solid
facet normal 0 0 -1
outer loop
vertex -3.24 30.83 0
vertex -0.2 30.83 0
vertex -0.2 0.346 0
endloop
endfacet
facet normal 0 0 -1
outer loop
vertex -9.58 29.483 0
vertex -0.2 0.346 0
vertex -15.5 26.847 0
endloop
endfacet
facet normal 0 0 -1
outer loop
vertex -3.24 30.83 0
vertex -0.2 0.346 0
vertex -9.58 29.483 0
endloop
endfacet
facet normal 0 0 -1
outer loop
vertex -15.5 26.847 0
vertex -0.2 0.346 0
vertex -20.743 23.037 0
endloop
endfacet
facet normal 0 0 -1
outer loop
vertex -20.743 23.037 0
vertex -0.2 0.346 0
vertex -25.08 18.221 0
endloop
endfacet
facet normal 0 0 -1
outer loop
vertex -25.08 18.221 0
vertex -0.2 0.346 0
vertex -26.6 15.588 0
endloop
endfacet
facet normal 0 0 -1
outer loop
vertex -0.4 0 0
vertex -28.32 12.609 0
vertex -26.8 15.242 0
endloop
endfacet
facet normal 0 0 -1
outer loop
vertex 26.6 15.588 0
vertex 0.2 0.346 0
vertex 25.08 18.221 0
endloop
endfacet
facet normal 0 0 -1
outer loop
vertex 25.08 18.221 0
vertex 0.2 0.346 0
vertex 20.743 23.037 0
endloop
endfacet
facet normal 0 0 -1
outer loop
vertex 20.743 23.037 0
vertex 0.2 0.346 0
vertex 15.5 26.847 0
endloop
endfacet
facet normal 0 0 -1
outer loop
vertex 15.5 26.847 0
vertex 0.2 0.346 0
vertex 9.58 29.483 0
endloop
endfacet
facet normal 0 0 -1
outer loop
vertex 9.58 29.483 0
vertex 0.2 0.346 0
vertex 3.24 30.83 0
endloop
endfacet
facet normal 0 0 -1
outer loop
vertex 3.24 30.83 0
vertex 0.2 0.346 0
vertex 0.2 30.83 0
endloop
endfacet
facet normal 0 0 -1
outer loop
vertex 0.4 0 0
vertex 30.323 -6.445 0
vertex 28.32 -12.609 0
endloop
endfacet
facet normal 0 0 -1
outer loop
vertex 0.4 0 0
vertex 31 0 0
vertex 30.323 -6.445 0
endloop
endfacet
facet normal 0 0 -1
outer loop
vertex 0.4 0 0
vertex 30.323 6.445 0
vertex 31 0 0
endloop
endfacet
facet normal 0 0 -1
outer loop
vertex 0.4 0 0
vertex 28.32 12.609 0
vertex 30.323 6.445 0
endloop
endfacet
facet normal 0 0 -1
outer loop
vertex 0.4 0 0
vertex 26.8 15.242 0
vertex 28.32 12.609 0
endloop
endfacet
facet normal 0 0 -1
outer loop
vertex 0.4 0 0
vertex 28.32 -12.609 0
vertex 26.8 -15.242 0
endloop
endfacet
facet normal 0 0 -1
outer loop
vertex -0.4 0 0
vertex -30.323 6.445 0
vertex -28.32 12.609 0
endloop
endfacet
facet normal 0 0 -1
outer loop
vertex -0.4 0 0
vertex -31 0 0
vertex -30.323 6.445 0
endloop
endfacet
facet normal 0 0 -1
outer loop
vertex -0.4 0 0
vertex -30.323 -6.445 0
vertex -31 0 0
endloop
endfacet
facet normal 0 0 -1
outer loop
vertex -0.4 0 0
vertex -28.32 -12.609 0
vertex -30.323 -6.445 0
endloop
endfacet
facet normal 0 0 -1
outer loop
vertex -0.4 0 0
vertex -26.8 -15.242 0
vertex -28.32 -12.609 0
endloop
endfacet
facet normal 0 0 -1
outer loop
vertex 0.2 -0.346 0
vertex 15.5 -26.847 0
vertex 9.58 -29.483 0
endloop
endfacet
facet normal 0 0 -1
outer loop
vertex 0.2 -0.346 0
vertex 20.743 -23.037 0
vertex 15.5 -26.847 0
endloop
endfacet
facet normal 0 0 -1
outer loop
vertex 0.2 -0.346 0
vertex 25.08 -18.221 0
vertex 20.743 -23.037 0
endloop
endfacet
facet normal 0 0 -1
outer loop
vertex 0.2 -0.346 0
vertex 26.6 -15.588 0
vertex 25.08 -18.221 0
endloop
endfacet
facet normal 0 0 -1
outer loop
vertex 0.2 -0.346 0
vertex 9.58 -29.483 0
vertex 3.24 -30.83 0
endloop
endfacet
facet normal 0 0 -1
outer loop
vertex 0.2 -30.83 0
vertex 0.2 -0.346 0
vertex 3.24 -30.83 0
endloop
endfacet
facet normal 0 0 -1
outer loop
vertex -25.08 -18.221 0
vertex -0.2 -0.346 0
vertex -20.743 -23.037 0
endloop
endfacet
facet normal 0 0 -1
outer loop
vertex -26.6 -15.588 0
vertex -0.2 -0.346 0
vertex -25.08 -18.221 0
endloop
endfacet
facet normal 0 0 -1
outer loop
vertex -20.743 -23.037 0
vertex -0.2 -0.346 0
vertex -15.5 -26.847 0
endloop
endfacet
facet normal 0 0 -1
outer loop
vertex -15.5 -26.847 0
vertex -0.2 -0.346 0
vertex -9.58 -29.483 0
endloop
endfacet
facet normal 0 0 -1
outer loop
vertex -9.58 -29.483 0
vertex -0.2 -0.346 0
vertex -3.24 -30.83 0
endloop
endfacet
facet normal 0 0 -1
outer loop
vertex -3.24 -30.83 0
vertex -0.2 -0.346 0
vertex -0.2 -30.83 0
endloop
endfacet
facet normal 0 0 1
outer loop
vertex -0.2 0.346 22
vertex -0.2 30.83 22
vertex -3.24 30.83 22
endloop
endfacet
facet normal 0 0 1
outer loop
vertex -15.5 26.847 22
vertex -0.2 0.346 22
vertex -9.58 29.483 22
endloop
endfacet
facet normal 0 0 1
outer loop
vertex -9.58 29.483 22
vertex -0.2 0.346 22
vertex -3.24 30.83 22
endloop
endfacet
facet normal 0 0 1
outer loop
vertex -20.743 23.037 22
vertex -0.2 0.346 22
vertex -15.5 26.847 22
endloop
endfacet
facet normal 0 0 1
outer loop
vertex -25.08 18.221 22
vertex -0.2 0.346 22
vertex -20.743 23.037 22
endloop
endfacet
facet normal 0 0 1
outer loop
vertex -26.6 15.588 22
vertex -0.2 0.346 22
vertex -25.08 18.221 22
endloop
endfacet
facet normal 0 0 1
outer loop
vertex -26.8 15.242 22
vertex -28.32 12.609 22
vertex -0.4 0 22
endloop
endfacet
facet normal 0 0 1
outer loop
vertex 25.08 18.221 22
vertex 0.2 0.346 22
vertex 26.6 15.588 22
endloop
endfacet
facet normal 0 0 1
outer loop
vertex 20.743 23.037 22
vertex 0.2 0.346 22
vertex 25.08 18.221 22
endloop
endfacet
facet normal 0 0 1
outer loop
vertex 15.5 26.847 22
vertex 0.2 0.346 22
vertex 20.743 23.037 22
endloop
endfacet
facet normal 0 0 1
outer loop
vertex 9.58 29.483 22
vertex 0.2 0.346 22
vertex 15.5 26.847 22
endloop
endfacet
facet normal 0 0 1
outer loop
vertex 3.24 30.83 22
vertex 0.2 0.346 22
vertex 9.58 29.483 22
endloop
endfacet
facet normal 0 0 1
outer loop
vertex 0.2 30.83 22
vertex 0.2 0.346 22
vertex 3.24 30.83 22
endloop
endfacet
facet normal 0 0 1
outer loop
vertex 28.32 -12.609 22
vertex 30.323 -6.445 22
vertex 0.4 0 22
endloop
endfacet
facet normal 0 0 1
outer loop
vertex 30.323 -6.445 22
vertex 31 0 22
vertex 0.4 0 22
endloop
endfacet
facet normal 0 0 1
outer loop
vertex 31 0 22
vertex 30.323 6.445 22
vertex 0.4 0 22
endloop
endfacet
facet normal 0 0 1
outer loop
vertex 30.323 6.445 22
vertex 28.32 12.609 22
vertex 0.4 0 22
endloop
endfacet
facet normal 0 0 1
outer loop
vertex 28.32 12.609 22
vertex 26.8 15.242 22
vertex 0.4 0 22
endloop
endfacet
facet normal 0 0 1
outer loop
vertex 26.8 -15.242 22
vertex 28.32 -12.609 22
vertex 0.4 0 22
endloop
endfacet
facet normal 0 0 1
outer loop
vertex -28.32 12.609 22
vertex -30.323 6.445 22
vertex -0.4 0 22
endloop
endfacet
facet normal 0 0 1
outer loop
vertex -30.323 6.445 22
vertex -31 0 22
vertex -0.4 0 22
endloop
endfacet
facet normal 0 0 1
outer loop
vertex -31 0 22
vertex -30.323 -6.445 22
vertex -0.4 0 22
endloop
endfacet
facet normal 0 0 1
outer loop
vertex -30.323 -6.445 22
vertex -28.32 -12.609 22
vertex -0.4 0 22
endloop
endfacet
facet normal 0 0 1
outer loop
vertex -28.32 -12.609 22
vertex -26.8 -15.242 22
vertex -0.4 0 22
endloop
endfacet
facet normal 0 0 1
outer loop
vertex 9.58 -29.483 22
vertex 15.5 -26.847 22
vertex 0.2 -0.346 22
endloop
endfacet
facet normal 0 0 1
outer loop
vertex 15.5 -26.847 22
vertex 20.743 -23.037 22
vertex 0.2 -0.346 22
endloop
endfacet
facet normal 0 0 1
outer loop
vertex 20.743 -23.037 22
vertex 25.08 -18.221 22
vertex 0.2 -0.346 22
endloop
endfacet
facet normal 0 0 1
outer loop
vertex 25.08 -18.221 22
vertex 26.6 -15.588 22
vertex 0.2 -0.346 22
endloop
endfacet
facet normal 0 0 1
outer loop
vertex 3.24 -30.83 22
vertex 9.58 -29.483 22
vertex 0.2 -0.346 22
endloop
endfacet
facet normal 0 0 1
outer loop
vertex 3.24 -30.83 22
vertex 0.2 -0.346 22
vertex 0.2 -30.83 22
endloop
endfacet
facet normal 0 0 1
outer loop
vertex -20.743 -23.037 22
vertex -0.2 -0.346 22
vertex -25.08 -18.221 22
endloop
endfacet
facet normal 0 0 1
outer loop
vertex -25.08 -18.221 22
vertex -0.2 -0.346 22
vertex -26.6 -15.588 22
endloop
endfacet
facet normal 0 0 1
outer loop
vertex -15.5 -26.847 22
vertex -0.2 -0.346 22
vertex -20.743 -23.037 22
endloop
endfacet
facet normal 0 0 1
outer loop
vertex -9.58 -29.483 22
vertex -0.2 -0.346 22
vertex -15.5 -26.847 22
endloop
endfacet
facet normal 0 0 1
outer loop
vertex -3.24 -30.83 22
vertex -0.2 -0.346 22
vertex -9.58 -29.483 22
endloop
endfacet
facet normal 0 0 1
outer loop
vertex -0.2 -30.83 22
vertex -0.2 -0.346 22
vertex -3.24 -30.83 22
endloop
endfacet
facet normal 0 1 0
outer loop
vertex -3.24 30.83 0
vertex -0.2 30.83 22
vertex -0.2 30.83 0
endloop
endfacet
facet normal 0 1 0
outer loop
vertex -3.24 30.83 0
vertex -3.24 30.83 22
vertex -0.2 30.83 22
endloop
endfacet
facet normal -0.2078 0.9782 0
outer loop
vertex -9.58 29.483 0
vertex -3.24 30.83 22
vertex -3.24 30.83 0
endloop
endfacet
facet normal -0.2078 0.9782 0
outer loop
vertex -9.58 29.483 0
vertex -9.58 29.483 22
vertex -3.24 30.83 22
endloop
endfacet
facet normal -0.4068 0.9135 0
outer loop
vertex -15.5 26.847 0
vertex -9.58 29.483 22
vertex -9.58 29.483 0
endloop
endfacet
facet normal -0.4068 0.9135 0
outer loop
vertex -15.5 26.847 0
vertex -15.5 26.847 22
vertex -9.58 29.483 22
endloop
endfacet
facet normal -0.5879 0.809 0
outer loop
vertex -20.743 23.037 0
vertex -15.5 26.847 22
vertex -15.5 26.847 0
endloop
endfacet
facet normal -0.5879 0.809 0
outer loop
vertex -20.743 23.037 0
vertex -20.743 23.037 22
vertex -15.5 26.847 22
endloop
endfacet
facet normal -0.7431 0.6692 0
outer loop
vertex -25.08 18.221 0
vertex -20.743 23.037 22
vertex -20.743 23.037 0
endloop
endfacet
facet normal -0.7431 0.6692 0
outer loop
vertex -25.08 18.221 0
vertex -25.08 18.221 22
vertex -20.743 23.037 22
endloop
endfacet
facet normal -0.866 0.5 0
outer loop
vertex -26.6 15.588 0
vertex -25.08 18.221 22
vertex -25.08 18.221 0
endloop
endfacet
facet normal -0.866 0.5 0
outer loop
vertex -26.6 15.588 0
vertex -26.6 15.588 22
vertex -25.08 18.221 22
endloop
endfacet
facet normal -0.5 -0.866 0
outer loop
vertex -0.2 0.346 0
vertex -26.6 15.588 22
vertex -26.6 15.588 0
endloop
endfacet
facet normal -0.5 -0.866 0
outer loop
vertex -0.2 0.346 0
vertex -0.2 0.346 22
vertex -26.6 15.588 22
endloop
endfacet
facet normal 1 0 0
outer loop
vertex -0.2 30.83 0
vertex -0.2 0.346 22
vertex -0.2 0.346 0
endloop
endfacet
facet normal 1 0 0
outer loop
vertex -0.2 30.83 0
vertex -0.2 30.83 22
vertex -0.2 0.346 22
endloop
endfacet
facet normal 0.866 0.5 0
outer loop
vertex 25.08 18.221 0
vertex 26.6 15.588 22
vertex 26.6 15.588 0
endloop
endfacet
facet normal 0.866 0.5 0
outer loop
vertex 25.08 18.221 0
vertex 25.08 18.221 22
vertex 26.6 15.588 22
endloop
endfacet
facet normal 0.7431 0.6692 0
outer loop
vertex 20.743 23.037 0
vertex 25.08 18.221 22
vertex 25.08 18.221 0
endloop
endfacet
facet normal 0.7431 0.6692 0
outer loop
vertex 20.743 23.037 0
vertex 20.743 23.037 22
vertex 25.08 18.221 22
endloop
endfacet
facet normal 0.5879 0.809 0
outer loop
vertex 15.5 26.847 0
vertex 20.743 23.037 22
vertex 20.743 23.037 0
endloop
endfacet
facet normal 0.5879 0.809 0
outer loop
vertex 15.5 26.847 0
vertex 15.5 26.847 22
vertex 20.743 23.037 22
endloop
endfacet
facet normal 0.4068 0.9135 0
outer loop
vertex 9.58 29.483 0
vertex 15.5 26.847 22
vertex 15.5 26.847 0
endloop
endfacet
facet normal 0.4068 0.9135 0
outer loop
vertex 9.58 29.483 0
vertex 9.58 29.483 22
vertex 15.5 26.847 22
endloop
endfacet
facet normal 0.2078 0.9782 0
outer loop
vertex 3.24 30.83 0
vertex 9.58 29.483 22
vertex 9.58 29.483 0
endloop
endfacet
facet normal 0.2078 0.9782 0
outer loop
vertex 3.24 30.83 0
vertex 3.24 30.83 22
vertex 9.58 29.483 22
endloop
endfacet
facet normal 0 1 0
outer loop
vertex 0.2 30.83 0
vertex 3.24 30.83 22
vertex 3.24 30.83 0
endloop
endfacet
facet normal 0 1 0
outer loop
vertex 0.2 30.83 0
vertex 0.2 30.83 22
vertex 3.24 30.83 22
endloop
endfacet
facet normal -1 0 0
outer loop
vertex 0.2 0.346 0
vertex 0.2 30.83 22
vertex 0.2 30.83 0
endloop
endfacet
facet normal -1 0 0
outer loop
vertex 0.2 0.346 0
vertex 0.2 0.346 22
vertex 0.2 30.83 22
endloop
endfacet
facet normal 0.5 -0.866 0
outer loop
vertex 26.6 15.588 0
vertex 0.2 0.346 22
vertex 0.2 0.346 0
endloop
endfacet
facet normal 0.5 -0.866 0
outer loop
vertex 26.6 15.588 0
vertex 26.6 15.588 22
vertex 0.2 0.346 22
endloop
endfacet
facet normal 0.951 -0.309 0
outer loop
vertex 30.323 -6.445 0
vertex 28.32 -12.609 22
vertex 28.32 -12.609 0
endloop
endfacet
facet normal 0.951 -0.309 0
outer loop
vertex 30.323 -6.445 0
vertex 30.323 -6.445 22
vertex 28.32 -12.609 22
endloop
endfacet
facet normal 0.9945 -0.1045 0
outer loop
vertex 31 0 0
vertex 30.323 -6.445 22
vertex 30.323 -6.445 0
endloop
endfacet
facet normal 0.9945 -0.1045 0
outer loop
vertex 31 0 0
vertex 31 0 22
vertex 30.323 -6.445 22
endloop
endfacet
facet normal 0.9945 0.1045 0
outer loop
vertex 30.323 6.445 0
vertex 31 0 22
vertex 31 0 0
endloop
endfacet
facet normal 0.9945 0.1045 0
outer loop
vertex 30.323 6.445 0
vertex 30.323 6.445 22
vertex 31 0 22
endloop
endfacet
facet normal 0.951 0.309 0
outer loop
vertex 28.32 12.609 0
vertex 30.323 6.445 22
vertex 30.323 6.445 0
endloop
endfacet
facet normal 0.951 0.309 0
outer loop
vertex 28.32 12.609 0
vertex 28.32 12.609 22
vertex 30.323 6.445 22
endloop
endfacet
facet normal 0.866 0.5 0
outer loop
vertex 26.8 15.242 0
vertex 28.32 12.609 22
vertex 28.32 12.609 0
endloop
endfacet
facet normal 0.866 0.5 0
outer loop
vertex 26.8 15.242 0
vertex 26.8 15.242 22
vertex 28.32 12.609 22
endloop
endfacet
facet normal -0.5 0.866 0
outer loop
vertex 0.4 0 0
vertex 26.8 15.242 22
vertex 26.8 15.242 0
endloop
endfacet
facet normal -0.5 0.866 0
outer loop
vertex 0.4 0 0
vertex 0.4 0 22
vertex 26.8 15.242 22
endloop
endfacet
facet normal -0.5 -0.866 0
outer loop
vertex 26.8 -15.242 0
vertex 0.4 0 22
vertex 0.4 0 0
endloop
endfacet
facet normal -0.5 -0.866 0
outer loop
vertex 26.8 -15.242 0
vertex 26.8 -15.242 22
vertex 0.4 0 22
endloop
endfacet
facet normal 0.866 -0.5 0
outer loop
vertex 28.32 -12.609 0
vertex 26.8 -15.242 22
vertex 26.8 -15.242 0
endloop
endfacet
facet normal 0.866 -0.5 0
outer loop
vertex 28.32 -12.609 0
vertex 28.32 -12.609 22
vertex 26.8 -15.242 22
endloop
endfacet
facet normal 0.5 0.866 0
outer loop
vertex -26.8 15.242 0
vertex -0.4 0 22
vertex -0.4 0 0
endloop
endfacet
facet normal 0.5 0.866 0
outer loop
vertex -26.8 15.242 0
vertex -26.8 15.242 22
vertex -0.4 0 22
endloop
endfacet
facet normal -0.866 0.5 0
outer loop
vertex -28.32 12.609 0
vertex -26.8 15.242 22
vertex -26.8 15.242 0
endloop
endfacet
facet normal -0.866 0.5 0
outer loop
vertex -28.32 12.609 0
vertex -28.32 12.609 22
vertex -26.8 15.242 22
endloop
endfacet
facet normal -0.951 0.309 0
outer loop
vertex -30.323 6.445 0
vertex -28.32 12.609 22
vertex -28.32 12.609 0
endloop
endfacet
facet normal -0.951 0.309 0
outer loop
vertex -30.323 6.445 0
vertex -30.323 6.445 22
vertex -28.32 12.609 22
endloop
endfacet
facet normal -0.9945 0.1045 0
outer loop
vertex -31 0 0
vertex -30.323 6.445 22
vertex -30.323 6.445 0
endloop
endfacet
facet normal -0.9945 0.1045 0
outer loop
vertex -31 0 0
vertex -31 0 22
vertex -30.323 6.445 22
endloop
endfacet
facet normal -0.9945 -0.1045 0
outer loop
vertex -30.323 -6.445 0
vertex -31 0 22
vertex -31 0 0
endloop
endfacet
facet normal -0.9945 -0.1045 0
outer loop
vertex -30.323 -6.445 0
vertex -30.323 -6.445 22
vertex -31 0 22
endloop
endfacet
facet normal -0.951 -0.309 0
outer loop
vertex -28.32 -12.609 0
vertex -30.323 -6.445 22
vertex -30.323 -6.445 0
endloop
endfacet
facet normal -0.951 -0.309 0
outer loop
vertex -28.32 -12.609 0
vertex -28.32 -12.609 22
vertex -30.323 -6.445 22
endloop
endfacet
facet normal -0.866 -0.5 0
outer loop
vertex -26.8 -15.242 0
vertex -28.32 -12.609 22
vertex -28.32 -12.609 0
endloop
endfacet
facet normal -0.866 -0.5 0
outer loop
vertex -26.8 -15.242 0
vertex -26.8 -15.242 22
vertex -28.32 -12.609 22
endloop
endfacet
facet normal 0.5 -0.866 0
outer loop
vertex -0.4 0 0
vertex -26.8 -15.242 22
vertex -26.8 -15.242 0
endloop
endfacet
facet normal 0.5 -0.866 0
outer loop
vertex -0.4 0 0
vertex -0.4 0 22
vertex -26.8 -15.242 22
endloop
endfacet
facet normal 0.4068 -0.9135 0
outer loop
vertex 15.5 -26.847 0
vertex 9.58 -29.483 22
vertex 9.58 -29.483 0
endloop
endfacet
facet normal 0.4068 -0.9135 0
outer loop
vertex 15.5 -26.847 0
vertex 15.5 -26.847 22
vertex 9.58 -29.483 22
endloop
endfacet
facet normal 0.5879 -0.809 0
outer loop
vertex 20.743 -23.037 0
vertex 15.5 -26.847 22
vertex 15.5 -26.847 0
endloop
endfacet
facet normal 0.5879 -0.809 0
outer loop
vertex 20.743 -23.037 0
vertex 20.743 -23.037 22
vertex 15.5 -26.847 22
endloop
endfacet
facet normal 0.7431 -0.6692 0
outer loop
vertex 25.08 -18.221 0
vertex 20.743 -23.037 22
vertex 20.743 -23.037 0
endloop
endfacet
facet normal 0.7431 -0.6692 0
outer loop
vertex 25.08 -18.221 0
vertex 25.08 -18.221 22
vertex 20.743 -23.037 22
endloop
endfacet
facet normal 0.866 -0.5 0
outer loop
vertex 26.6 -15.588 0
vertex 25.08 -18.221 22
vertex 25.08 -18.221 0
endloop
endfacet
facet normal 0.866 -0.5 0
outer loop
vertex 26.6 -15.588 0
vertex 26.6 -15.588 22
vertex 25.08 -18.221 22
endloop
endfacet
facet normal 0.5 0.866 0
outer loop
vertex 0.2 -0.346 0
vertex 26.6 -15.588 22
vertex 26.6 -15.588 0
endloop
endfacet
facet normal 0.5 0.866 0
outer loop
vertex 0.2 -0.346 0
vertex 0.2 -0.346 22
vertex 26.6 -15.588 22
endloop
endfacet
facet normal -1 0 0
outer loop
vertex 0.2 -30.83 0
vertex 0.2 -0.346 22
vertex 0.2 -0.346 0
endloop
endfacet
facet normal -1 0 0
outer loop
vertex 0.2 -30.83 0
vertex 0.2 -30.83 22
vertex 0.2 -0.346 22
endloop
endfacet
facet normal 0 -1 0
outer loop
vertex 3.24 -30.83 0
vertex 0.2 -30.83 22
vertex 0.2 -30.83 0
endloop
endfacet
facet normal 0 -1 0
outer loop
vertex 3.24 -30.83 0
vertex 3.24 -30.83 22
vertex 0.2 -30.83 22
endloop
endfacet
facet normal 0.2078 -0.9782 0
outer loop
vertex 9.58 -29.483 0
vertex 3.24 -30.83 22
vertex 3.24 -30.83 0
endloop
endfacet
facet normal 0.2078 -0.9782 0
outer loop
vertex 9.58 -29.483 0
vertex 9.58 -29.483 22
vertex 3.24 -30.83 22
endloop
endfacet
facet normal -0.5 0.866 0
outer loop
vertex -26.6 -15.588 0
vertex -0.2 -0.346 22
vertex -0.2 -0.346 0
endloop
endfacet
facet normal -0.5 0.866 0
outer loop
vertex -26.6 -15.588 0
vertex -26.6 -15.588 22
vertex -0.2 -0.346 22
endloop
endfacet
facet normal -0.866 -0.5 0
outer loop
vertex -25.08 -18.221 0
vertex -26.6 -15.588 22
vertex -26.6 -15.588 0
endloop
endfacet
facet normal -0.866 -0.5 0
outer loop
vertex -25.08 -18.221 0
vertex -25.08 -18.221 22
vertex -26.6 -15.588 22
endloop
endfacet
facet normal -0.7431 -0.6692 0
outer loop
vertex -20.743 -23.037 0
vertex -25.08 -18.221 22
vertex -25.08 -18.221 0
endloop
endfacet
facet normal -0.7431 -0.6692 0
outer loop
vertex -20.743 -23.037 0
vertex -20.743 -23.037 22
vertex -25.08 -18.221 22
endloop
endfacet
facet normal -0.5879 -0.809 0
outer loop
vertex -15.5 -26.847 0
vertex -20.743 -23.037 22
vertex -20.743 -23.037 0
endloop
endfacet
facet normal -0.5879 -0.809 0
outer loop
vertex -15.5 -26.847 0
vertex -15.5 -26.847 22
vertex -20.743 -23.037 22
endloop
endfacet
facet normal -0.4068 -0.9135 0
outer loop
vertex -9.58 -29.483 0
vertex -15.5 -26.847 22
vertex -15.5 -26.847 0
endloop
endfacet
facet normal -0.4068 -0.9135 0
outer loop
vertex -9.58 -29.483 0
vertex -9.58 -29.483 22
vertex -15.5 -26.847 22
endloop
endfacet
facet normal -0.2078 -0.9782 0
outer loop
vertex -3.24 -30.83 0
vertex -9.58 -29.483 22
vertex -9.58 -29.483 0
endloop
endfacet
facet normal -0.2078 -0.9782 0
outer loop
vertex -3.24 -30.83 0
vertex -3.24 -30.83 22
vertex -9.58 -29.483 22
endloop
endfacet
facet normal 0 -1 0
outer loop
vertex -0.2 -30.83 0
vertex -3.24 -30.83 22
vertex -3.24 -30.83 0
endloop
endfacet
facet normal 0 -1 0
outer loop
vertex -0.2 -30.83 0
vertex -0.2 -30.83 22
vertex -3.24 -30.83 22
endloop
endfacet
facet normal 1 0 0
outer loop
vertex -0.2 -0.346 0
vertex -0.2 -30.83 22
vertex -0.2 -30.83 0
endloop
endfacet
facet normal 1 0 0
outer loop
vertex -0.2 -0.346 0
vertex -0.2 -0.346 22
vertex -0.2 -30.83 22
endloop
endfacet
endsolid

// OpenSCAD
//Konfiguration
//Radius
    r = 31;
//Höhe des Kuchens
    h = 22;
//Anzahl der Stücke (gerade Zahl)
    n = 6;
    
module Schnitt (b = 0.4, l = 2*r+2)
    translate([0, 0, 0])
    for (i = [0:n-1]) {
        rotate(i*360/n)
        square([b, l], true);
    }

module Kuchen ()
    linear_extrude(height = h)
    difference(){
        circle(r, true);
        Schnitt();   
}

Kuchen ();
